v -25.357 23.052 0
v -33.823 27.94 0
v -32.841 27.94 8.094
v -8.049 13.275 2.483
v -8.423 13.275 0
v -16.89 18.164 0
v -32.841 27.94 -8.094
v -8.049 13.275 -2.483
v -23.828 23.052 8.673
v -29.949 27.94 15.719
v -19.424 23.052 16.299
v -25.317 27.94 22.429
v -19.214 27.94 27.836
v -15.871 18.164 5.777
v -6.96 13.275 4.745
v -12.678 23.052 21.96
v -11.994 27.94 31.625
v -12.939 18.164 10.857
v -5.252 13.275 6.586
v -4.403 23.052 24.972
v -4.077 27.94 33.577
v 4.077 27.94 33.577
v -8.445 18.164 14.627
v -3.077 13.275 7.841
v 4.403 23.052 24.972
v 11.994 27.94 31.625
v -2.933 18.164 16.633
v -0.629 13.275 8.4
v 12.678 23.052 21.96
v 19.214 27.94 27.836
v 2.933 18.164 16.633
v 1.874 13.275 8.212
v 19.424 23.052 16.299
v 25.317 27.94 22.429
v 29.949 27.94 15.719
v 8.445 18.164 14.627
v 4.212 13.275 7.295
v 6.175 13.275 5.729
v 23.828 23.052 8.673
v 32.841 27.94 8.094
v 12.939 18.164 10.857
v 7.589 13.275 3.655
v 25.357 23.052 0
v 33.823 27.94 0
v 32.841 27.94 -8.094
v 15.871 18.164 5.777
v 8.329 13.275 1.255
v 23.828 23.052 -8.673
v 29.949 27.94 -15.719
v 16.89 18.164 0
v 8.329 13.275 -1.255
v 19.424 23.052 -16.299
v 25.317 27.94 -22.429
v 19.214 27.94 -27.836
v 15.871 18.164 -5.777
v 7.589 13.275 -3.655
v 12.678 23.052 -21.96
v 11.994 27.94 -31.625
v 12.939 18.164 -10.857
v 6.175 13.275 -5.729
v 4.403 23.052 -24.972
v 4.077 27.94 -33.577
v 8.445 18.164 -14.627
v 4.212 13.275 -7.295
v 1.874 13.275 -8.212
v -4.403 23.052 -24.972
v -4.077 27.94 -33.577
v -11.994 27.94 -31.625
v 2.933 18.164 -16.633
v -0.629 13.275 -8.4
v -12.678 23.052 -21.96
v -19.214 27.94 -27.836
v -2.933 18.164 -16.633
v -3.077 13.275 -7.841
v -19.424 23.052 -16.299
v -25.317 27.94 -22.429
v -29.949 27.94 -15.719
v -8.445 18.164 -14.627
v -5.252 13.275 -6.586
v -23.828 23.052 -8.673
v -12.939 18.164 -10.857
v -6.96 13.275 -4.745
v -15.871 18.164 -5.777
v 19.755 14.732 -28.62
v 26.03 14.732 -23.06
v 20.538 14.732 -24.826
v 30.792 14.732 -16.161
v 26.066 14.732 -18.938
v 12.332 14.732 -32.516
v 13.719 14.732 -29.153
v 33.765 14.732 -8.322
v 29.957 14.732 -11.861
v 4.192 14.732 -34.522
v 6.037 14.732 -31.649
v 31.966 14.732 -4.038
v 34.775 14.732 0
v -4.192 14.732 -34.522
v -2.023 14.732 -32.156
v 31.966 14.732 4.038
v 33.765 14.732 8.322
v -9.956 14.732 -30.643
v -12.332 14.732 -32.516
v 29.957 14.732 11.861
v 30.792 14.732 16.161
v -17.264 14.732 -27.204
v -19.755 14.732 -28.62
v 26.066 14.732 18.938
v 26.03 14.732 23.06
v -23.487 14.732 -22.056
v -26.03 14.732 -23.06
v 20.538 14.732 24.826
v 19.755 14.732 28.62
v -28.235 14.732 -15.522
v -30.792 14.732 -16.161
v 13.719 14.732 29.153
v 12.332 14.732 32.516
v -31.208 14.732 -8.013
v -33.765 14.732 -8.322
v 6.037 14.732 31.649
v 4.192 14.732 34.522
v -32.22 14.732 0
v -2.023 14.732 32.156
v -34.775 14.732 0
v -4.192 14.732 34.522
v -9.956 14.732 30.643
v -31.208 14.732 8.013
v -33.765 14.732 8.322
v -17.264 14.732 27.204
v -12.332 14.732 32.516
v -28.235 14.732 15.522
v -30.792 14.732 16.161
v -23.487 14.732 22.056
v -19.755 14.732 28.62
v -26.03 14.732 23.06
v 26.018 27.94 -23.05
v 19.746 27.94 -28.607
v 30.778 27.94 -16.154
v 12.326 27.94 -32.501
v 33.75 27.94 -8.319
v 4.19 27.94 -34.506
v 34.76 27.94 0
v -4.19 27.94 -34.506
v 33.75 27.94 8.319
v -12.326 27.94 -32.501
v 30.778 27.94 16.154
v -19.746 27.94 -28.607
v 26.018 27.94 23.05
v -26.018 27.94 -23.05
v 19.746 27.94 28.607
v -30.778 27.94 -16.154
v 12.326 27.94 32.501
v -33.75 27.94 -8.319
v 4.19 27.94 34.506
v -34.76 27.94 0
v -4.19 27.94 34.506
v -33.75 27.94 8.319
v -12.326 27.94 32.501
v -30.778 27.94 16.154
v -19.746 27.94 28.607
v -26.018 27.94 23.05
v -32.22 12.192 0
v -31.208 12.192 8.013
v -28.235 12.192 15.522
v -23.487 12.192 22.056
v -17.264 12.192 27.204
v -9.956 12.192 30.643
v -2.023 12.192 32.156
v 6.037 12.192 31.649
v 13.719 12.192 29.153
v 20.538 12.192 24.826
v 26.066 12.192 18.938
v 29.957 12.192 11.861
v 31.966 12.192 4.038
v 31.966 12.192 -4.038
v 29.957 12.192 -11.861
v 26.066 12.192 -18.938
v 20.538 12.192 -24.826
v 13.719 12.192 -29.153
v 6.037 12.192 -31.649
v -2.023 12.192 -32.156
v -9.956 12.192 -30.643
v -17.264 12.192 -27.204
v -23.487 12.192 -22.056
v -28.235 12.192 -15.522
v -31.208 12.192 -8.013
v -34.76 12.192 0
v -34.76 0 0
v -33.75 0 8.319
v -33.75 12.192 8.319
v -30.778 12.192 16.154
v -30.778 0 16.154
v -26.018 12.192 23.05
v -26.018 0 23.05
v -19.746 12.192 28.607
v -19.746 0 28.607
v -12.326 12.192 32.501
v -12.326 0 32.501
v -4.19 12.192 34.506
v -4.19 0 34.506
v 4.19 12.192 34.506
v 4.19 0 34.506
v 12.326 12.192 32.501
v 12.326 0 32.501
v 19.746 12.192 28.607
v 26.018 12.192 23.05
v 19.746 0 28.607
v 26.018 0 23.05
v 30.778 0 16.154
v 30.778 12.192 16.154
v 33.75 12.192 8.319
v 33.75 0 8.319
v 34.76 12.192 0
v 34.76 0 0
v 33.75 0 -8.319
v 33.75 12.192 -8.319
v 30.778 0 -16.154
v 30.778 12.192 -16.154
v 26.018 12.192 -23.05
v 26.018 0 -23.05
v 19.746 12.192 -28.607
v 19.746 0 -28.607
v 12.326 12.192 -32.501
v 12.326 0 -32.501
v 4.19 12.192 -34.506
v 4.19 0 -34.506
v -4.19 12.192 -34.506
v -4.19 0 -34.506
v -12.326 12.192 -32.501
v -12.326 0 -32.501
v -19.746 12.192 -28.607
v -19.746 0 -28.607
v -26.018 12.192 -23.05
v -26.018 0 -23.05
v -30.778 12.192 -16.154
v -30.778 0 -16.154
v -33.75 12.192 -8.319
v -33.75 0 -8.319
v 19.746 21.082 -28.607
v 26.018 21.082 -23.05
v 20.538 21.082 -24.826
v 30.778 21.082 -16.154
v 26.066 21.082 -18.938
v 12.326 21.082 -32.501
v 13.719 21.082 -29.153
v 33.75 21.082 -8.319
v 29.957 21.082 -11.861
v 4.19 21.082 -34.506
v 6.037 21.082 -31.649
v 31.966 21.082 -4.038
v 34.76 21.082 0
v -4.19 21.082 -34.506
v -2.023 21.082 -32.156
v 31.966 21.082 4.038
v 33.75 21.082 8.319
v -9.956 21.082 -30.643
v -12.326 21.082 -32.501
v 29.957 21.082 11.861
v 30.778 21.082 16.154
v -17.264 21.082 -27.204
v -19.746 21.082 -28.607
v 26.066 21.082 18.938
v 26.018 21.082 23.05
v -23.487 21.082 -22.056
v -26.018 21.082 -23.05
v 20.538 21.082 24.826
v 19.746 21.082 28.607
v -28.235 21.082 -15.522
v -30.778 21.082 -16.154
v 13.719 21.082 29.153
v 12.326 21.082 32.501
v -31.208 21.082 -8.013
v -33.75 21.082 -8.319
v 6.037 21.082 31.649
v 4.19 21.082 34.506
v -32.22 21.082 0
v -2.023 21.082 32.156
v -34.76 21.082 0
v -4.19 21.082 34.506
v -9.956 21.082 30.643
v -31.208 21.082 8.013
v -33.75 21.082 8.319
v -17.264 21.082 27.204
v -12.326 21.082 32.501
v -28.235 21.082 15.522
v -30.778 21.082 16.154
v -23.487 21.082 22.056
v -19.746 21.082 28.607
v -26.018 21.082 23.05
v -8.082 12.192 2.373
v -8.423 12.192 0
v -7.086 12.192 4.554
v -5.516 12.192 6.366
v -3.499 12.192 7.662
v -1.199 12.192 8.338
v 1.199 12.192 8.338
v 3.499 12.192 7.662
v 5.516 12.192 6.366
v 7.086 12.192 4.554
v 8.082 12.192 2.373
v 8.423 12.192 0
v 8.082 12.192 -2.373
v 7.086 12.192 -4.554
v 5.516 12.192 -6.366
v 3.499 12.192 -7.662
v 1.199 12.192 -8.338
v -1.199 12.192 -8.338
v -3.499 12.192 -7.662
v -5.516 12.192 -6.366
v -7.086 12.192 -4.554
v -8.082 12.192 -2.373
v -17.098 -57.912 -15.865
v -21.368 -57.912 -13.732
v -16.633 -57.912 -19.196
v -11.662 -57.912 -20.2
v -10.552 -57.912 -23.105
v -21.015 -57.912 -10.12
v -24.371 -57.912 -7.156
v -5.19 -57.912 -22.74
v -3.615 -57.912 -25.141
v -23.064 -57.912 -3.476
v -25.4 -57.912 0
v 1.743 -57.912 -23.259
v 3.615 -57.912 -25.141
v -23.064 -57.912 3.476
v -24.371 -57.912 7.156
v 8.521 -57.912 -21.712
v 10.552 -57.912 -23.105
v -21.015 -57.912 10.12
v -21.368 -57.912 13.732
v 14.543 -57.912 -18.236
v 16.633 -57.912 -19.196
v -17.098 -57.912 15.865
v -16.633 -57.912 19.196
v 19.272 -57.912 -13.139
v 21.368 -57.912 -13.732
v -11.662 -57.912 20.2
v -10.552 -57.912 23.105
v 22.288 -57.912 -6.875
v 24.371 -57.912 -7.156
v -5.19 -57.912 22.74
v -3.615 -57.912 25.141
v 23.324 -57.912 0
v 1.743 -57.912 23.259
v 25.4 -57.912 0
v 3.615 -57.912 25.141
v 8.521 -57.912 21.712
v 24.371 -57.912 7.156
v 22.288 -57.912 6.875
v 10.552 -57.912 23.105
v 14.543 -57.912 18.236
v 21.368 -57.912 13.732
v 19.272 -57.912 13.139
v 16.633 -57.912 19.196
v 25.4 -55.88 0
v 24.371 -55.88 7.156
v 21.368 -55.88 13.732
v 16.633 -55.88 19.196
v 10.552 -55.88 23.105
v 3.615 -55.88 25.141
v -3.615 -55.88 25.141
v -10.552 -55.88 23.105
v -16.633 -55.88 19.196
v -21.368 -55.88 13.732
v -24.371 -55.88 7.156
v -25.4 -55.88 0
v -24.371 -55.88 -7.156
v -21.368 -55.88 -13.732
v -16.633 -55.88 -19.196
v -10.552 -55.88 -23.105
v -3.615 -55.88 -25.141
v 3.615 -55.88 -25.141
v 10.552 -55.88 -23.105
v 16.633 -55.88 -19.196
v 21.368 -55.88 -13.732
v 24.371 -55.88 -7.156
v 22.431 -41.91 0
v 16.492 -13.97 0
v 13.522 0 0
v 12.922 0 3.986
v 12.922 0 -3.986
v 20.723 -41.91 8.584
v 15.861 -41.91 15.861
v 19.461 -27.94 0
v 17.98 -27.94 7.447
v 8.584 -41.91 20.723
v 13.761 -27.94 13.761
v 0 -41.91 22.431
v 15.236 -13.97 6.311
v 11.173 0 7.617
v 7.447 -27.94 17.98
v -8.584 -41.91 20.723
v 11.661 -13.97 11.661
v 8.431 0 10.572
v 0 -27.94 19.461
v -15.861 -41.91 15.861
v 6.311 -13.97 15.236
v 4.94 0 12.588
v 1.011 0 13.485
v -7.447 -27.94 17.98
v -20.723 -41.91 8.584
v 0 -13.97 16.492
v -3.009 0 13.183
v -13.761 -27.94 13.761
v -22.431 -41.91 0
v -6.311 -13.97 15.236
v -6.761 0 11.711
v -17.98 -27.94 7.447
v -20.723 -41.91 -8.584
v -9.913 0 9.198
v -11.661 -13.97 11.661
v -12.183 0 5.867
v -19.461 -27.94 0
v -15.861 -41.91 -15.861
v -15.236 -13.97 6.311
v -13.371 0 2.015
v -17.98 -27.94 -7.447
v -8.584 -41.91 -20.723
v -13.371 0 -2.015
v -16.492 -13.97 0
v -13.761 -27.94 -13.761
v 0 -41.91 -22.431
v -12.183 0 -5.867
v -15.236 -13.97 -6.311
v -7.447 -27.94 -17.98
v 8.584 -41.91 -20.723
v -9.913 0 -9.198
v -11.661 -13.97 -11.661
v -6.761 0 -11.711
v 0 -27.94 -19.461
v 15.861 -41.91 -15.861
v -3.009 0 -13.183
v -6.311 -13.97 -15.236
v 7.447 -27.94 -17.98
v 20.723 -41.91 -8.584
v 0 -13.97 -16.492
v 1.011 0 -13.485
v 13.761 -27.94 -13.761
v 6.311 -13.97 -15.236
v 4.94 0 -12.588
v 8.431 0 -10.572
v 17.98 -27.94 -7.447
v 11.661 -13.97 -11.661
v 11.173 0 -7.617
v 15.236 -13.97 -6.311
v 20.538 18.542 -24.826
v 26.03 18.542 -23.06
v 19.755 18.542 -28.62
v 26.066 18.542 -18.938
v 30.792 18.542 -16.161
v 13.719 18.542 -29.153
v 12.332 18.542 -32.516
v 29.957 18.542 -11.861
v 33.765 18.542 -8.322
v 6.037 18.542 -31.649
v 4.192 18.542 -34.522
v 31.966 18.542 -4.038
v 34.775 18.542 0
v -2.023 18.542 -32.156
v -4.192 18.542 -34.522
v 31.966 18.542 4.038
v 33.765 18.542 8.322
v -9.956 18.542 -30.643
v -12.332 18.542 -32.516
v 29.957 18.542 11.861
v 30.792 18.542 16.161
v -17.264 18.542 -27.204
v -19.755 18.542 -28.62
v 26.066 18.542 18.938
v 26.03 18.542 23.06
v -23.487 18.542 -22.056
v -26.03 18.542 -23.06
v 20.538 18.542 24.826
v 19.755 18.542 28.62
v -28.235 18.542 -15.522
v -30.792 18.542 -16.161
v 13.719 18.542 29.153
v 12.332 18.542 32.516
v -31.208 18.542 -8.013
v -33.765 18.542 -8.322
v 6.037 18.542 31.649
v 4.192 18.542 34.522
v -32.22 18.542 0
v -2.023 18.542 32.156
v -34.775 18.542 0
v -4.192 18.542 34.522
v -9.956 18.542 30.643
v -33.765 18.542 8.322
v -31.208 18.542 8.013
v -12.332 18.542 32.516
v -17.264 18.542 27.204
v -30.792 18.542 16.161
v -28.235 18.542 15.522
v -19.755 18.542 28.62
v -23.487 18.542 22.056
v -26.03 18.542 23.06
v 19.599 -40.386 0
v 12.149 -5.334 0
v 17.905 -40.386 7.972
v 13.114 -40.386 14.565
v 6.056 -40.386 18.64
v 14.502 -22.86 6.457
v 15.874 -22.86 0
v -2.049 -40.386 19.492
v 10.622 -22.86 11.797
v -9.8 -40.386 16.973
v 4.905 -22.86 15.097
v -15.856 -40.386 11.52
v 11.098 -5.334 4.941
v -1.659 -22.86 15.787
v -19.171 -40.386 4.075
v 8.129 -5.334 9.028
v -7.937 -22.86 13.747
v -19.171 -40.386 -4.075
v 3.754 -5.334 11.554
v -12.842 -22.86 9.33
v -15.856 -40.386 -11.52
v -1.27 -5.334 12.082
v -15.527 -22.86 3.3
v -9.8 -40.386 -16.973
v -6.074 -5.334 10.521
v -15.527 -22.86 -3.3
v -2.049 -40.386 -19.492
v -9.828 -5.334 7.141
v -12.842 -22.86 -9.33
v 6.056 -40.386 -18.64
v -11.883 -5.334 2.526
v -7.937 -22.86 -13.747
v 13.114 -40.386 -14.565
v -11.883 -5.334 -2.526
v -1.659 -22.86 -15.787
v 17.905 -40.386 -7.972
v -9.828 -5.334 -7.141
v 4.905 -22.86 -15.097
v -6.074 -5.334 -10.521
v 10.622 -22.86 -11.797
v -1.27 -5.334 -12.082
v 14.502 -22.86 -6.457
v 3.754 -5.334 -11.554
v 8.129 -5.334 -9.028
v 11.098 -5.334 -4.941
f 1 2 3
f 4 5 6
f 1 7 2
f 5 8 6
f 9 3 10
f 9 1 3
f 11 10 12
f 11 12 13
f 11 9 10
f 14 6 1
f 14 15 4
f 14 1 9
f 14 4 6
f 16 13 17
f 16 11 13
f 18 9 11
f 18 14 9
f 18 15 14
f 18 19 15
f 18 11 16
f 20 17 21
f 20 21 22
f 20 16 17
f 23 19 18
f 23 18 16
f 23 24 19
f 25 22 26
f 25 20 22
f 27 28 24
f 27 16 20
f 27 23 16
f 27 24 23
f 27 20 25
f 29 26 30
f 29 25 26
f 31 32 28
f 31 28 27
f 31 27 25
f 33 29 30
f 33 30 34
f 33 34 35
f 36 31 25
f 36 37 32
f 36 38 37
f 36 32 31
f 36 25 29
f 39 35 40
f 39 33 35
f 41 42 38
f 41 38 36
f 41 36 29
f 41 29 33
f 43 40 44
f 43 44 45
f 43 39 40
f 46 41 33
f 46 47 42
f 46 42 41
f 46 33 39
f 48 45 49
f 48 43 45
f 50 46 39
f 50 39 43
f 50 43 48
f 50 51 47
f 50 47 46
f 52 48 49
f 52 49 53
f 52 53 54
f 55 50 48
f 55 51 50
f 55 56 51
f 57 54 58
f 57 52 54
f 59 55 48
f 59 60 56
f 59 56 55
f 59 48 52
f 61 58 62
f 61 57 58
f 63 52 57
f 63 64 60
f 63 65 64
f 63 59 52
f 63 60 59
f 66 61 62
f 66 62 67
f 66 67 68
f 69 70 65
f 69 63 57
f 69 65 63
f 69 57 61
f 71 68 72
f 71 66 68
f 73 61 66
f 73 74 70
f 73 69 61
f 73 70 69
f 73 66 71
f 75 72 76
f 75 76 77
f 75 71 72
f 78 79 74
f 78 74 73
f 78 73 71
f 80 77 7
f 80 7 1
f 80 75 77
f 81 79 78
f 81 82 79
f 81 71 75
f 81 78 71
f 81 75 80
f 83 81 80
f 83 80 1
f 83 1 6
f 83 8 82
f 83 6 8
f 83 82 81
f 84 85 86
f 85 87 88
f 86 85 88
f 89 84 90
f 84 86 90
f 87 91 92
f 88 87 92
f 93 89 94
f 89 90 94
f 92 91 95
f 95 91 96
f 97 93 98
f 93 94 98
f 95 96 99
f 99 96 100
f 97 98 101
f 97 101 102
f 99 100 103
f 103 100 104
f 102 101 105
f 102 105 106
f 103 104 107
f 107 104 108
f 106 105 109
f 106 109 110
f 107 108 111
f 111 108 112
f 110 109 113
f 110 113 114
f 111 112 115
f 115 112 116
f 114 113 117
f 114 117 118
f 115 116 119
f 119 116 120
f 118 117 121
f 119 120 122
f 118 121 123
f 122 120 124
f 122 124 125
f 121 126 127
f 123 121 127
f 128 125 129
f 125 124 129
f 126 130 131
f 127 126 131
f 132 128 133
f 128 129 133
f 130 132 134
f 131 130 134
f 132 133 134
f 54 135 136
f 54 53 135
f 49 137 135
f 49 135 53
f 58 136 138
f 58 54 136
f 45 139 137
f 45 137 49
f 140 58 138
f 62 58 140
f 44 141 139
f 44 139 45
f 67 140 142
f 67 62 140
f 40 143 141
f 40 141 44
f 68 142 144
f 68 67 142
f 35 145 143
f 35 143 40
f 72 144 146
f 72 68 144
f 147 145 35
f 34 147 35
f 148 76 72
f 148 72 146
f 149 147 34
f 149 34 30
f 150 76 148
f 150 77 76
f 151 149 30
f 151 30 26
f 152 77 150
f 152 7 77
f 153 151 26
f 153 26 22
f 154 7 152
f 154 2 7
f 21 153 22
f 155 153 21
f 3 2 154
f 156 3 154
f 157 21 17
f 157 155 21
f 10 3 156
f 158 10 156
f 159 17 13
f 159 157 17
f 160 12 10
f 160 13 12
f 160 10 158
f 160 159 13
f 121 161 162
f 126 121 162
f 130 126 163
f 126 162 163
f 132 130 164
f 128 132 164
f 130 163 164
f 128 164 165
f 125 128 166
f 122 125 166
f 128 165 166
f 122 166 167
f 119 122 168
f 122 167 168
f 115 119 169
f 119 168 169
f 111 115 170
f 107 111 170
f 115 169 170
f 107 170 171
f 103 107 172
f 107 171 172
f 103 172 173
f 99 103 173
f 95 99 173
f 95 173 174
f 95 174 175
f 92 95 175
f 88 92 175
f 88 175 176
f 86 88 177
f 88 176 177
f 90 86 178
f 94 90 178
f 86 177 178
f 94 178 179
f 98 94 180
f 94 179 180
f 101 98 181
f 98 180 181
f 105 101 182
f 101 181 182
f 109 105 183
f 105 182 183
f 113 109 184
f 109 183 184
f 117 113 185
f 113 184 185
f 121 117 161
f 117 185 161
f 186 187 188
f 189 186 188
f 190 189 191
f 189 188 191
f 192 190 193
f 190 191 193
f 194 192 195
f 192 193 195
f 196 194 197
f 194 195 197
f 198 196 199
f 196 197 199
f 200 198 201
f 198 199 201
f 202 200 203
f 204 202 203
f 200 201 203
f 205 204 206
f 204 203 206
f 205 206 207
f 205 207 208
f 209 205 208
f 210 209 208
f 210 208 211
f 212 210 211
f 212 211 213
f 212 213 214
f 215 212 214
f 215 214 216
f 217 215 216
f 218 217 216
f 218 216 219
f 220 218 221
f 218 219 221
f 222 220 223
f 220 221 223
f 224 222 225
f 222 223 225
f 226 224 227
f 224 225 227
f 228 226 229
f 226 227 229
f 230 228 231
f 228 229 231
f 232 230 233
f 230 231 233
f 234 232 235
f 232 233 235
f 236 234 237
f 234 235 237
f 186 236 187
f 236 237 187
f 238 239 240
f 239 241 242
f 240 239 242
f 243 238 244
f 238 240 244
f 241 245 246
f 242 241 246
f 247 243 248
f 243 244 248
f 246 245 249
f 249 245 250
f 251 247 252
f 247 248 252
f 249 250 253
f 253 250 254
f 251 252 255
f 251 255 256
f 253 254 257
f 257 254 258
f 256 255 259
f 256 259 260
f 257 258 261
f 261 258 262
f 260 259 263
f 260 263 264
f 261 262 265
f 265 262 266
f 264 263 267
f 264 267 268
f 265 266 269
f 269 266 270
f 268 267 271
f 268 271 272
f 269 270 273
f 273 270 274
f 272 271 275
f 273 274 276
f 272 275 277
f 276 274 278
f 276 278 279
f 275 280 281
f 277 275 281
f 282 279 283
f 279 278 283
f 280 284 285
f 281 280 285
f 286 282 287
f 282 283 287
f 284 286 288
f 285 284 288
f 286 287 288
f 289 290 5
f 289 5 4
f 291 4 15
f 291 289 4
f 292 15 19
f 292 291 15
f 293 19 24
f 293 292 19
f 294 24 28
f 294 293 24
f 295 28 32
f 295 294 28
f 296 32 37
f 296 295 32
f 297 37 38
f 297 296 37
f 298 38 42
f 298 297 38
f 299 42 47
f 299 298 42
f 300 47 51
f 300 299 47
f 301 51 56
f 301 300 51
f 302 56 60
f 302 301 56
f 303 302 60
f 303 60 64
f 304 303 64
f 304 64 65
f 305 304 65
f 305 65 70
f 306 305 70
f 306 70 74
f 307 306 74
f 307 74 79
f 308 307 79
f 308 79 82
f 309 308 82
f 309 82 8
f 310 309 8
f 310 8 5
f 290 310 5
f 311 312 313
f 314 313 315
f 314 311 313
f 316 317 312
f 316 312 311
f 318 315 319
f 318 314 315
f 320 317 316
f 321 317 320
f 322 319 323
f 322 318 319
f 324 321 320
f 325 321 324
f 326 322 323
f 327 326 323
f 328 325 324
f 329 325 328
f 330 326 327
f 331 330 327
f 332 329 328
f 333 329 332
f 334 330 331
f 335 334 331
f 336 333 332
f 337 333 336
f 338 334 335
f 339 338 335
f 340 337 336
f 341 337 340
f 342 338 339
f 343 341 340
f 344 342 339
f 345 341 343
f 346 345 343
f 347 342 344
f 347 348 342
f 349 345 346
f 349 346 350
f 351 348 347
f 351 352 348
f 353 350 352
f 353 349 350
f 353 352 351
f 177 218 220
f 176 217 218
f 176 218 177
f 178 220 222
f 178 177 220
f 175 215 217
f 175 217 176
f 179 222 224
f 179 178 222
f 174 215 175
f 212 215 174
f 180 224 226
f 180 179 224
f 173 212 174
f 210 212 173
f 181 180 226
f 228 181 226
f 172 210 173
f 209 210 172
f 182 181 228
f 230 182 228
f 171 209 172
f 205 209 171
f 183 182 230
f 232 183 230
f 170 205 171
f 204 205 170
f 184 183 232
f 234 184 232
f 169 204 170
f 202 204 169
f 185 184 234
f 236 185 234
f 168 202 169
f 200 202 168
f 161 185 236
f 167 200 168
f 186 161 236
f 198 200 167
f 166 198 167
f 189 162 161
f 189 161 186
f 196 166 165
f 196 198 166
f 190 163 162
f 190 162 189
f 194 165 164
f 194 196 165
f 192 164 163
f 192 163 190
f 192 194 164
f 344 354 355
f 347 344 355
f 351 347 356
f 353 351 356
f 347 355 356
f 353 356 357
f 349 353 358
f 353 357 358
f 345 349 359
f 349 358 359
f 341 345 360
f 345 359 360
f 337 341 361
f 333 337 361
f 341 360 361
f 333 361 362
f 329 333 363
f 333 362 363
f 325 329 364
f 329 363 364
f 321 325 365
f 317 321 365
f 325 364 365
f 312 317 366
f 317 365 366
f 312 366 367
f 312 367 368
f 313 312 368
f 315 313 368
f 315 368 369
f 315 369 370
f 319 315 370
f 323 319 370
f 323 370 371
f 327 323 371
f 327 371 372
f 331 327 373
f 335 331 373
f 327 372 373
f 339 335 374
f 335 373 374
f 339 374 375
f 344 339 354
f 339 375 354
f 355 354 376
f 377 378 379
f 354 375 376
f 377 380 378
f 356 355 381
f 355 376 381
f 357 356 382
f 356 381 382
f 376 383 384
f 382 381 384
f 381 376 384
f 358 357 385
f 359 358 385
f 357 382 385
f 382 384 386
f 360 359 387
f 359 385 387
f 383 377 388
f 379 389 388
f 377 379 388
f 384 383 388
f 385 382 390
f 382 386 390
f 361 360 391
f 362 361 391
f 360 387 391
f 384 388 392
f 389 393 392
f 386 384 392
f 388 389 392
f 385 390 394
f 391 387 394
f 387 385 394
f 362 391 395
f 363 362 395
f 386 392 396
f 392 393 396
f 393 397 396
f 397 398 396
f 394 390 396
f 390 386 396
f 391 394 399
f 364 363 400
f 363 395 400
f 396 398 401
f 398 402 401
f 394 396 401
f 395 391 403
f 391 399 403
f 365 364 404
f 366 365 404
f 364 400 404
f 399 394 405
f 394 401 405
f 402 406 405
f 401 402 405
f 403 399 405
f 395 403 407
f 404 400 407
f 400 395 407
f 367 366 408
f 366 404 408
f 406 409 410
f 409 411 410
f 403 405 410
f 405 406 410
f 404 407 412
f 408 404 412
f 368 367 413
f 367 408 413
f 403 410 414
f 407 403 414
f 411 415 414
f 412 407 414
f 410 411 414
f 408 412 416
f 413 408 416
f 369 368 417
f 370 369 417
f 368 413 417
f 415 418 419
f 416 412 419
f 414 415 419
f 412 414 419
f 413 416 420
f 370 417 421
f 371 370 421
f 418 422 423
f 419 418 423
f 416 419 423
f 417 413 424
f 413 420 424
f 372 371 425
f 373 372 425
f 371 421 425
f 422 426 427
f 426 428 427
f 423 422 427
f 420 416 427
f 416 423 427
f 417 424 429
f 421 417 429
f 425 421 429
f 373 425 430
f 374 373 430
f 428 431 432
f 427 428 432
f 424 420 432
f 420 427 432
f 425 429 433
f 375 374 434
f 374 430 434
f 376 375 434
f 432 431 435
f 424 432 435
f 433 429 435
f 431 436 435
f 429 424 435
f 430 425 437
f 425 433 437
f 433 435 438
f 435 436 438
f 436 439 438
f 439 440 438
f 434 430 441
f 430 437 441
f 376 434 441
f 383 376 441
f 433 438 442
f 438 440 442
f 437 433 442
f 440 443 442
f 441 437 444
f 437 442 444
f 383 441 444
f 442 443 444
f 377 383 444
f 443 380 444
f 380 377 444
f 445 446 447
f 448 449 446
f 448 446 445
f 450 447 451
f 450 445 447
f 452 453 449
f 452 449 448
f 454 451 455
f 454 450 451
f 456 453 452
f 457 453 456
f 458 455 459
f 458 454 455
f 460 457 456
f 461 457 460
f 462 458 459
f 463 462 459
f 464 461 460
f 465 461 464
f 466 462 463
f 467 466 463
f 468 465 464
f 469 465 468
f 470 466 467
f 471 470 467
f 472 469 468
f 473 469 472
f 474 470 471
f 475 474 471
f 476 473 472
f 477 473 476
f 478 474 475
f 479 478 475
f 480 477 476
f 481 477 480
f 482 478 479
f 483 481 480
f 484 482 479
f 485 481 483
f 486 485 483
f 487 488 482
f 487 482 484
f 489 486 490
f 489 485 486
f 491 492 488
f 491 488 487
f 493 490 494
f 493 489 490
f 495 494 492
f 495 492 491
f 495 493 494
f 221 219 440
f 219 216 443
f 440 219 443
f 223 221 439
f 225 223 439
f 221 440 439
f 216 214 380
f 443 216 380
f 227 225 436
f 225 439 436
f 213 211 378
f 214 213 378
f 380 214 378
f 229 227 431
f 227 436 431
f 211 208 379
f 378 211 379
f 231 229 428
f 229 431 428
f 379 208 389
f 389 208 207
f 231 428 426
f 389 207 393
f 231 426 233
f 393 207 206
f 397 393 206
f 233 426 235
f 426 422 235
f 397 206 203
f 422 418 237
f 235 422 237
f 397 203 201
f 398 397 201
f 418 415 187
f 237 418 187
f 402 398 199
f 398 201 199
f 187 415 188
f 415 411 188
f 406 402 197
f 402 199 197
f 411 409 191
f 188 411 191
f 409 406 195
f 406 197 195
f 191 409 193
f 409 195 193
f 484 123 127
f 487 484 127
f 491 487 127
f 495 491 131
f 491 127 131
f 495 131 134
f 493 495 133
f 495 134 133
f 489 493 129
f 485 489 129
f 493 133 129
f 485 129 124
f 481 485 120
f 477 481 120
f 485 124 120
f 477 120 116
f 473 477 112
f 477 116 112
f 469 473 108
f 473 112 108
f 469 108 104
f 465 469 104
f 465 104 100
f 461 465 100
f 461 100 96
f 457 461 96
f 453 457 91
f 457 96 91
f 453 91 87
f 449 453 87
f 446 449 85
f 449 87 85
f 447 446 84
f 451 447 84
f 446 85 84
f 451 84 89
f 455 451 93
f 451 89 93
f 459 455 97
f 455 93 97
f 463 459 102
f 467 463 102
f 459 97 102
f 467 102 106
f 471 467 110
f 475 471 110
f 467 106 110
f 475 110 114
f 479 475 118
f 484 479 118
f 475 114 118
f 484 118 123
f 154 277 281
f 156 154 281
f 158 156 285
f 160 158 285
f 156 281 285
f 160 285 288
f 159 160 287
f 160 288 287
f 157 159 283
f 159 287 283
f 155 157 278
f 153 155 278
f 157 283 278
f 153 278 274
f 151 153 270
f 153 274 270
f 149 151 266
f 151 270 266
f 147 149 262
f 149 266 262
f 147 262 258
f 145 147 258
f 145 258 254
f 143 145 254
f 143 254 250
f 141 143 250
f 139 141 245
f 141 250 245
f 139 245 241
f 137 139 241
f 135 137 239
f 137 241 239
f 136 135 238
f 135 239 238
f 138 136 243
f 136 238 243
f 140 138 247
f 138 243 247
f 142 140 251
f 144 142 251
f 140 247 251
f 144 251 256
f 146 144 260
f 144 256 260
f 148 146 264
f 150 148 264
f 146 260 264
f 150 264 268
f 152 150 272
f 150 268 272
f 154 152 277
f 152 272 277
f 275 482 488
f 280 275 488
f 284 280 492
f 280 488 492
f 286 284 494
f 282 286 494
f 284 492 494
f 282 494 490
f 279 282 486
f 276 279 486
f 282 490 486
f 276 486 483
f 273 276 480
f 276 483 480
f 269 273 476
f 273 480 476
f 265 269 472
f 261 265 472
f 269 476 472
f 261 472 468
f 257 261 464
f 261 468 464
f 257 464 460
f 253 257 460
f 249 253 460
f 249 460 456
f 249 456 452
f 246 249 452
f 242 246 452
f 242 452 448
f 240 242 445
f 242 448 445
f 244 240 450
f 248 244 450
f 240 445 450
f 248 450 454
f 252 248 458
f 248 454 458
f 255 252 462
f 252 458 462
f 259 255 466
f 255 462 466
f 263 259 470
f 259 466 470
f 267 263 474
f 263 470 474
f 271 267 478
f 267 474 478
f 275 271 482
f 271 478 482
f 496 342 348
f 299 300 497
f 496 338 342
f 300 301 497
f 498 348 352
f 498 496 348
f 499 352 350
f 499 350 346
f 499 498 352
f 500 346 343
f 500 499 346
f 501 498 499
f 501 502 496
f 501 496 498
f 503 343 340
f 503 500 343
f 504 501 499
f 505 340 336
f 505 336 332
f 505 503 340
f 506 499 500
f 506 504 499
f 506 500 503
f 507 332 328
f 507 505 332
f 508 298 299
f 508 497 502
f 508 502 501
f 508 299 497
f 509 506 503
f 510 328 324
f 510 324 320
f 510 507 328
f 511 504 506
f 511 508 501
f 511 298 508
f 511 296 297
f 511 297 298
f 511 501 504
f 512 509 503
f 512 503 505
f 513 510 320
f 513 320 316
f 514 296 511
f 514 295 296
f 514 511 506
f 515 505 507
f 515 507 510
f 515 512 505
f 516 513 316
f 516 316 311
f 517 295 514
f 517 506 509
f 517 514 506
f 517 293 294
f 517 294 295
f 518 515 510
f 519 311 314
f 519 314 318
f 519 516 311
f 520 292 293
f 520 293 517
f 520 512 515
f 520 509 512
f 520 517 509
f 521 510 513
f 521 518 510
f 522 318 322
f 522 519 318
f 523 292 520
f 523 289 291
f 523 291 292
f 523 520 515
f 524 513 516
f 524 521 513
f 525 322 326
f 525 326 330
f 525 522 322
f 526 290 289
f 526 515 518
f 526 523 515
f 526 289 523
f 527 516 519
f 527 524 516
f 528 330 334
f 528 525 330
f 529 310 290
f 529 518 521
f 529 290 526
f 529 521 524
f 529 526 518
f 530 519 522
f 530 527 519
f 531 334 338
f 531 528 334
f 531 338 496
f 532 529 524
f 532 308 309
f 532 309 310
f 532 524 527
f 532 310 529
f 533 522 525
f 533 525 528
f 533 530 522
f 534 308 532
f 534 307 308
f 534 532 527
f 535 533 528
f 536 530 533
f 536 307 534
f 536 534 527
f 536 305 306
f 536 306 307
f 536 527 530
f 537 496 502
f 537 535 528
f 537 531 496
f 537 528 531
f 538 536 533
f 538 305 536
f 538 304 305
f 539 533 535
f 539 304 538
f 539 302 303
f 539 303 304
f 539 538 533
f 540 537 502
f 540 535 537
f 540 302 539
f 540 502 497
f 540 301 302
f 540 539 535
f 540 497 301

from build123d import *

# Parameters (mm, degrees)
F0_R      = 25.4
F0_R_2    = 7.9375
F1_DEPTH  = 57.912
F2_SIZE2  = 11.8776606661
F2_SIZE   = 55.88
F3_R      = 34.7599
F3_R_2    = 13.5223393339
F3_R_3    = 7.9375
F4_DEPTH  = 12.192
F6_R      = 32.2199
F6_R_2    = 8.4234043
F7_DEPTH  = 2.54
F8_R      = 34.7754798106
F8_R_2    = 32.2199
F8_R_3    = 8.4234043
F9_DEPTH  = 3.81
F10_R     = 32.2199
F10_R_2   = 8.4234043
F11_DEPTH = 2.54
F13_R     = 34.7599
F13_R_2   = 32.2199
F12_R     = 32.2199
F12_R_2   = 8.4234043
F14_DEPTH = 6.858
F15_SIZE2 = 14.6646968374
F15_SIZE  = 25.4


# Not quite as in the source:
# - a fillet or chamfer that OpenCascade refuses, or shapes differently, is made with other operations: its cross-section is extruded or revolved along the edge and cut away or added


with BuildPart() as f1:
    # F0 (on Front) → F1 (new body)
    with BuildSketch(Plane.XZ):
        Circle(F0_R)
        Circle(F0_R_2, mode=Mode.SUBTRACT)
    extrude(amount=F1_DEPTH)

    # F2
    f2_edges = [f1.edges().sort_by_distance(p)[0] for p in [
        (-25.4, 0, 0),
    ]]
    f2_side = f1.faces().sort_by_distance((-25.4, -28.956, 0))[0]
    chamfer(f2_edges, length=F2_SIZE, length2=F2_SIZE2, reference=f2_side)

    # F3 (on face) → F4 (join)
    with BuildSketch(Plane(origin=(0, 0, 0), x_dir=(-1, 0, 0), z_dir=(0, 1, 0))):
        Circle(F3_R)
        Circle(F3_R_2, mode=Mode.SUBTRACT)
        Circle(F3_R_2)
        Circle(F3_R_3, mode=Mode.SUBTRACT)
    extrude(amount=F4_DEPTH)

    # F5: chamfer of 72.39 x 15.3869694993 on 1 edges, made by hand

    # F5_s1 → F5_t2 (revolve, cut)
    with BuildSketch(Plane.XY):
        Polygon((23.3244694993, -57.912), (7.9375, 14.478), (7.9375, -57.912), align=None)
    revolve(axis=Axis((0, -57.912, 0), (0, -1, 0)), mode=Mode.SUBTRACT)

    # F6 (on face) → F7 (join)
    with BuildSketch(Plane(origin=(0, 12.192, 0), x_dir=(-1, 0, 0), z_dir=(0, 1, 0))):
        Circle(F6_R)
        Circle(F6_R_2, mode=Mode.SUBTRACT)
    extrude(amount=F7_DEPTH)

    # F8 (on face) → F9 (join)
    with BuildSketch(Plane(origin=(0, 14.732, 0), x_dir=(-1, 0, 0), z_dir=(0, 1, 0))):
        Circle(F8_R)
        Circle(F8_R_2, mode=Mode.SUBTRACT)
        Circle(F8_R_2)
        Circle(F8_R_3, mode=Mode.SUBTRACT)
    extrude(amount=F9_DEPTH)

    # F10 (on face) → F11 (join)
    with BuildSketch(Plane(origin=(0, 18.542, 0), x_dir=(-1, 0, 0), z_dir=(0, 1, 0))):
        Circle(F10_R)
        Circle(F10_R_2, mode=Mode.SUBTRACT)
    extrude(amount=F11_DEPTH)

    # F13 (on face) + F12 (on face) → F14 (join)
    with BuildSketch(Plane(origin=(0, 21.082, 0), x_dir=(-1, 0, 0), z_dir=(0, 1, 0))):
        Circle(F13_R)
        Circle(F13_R_2, mode=Mode.SUBTRACT)
    with BuildSketch(Plane(origin=(0, 21.082, 0), x_dir=(-1, 0, 0), z_dir=(0, 1, 0))):
        Circle(F12_R)
        Circle(F12_R_2, mode=Mode.SUBTRACT)
    extrude(amount=F14_DEPTH)

    # F15
    f15_edges = [f1.edges().sort_by_distance(p)[0] for p in [
        (8.423404, 27.94, 0),
    ]]
    f15_side = f1.faces().sort_by_distance((33.776742, 27.94, 0))[0]
    chamfer(f15_edges, length=F15_SIZE, length2=F15_SIZE2, reference=f15_side)


solid = f1.part
